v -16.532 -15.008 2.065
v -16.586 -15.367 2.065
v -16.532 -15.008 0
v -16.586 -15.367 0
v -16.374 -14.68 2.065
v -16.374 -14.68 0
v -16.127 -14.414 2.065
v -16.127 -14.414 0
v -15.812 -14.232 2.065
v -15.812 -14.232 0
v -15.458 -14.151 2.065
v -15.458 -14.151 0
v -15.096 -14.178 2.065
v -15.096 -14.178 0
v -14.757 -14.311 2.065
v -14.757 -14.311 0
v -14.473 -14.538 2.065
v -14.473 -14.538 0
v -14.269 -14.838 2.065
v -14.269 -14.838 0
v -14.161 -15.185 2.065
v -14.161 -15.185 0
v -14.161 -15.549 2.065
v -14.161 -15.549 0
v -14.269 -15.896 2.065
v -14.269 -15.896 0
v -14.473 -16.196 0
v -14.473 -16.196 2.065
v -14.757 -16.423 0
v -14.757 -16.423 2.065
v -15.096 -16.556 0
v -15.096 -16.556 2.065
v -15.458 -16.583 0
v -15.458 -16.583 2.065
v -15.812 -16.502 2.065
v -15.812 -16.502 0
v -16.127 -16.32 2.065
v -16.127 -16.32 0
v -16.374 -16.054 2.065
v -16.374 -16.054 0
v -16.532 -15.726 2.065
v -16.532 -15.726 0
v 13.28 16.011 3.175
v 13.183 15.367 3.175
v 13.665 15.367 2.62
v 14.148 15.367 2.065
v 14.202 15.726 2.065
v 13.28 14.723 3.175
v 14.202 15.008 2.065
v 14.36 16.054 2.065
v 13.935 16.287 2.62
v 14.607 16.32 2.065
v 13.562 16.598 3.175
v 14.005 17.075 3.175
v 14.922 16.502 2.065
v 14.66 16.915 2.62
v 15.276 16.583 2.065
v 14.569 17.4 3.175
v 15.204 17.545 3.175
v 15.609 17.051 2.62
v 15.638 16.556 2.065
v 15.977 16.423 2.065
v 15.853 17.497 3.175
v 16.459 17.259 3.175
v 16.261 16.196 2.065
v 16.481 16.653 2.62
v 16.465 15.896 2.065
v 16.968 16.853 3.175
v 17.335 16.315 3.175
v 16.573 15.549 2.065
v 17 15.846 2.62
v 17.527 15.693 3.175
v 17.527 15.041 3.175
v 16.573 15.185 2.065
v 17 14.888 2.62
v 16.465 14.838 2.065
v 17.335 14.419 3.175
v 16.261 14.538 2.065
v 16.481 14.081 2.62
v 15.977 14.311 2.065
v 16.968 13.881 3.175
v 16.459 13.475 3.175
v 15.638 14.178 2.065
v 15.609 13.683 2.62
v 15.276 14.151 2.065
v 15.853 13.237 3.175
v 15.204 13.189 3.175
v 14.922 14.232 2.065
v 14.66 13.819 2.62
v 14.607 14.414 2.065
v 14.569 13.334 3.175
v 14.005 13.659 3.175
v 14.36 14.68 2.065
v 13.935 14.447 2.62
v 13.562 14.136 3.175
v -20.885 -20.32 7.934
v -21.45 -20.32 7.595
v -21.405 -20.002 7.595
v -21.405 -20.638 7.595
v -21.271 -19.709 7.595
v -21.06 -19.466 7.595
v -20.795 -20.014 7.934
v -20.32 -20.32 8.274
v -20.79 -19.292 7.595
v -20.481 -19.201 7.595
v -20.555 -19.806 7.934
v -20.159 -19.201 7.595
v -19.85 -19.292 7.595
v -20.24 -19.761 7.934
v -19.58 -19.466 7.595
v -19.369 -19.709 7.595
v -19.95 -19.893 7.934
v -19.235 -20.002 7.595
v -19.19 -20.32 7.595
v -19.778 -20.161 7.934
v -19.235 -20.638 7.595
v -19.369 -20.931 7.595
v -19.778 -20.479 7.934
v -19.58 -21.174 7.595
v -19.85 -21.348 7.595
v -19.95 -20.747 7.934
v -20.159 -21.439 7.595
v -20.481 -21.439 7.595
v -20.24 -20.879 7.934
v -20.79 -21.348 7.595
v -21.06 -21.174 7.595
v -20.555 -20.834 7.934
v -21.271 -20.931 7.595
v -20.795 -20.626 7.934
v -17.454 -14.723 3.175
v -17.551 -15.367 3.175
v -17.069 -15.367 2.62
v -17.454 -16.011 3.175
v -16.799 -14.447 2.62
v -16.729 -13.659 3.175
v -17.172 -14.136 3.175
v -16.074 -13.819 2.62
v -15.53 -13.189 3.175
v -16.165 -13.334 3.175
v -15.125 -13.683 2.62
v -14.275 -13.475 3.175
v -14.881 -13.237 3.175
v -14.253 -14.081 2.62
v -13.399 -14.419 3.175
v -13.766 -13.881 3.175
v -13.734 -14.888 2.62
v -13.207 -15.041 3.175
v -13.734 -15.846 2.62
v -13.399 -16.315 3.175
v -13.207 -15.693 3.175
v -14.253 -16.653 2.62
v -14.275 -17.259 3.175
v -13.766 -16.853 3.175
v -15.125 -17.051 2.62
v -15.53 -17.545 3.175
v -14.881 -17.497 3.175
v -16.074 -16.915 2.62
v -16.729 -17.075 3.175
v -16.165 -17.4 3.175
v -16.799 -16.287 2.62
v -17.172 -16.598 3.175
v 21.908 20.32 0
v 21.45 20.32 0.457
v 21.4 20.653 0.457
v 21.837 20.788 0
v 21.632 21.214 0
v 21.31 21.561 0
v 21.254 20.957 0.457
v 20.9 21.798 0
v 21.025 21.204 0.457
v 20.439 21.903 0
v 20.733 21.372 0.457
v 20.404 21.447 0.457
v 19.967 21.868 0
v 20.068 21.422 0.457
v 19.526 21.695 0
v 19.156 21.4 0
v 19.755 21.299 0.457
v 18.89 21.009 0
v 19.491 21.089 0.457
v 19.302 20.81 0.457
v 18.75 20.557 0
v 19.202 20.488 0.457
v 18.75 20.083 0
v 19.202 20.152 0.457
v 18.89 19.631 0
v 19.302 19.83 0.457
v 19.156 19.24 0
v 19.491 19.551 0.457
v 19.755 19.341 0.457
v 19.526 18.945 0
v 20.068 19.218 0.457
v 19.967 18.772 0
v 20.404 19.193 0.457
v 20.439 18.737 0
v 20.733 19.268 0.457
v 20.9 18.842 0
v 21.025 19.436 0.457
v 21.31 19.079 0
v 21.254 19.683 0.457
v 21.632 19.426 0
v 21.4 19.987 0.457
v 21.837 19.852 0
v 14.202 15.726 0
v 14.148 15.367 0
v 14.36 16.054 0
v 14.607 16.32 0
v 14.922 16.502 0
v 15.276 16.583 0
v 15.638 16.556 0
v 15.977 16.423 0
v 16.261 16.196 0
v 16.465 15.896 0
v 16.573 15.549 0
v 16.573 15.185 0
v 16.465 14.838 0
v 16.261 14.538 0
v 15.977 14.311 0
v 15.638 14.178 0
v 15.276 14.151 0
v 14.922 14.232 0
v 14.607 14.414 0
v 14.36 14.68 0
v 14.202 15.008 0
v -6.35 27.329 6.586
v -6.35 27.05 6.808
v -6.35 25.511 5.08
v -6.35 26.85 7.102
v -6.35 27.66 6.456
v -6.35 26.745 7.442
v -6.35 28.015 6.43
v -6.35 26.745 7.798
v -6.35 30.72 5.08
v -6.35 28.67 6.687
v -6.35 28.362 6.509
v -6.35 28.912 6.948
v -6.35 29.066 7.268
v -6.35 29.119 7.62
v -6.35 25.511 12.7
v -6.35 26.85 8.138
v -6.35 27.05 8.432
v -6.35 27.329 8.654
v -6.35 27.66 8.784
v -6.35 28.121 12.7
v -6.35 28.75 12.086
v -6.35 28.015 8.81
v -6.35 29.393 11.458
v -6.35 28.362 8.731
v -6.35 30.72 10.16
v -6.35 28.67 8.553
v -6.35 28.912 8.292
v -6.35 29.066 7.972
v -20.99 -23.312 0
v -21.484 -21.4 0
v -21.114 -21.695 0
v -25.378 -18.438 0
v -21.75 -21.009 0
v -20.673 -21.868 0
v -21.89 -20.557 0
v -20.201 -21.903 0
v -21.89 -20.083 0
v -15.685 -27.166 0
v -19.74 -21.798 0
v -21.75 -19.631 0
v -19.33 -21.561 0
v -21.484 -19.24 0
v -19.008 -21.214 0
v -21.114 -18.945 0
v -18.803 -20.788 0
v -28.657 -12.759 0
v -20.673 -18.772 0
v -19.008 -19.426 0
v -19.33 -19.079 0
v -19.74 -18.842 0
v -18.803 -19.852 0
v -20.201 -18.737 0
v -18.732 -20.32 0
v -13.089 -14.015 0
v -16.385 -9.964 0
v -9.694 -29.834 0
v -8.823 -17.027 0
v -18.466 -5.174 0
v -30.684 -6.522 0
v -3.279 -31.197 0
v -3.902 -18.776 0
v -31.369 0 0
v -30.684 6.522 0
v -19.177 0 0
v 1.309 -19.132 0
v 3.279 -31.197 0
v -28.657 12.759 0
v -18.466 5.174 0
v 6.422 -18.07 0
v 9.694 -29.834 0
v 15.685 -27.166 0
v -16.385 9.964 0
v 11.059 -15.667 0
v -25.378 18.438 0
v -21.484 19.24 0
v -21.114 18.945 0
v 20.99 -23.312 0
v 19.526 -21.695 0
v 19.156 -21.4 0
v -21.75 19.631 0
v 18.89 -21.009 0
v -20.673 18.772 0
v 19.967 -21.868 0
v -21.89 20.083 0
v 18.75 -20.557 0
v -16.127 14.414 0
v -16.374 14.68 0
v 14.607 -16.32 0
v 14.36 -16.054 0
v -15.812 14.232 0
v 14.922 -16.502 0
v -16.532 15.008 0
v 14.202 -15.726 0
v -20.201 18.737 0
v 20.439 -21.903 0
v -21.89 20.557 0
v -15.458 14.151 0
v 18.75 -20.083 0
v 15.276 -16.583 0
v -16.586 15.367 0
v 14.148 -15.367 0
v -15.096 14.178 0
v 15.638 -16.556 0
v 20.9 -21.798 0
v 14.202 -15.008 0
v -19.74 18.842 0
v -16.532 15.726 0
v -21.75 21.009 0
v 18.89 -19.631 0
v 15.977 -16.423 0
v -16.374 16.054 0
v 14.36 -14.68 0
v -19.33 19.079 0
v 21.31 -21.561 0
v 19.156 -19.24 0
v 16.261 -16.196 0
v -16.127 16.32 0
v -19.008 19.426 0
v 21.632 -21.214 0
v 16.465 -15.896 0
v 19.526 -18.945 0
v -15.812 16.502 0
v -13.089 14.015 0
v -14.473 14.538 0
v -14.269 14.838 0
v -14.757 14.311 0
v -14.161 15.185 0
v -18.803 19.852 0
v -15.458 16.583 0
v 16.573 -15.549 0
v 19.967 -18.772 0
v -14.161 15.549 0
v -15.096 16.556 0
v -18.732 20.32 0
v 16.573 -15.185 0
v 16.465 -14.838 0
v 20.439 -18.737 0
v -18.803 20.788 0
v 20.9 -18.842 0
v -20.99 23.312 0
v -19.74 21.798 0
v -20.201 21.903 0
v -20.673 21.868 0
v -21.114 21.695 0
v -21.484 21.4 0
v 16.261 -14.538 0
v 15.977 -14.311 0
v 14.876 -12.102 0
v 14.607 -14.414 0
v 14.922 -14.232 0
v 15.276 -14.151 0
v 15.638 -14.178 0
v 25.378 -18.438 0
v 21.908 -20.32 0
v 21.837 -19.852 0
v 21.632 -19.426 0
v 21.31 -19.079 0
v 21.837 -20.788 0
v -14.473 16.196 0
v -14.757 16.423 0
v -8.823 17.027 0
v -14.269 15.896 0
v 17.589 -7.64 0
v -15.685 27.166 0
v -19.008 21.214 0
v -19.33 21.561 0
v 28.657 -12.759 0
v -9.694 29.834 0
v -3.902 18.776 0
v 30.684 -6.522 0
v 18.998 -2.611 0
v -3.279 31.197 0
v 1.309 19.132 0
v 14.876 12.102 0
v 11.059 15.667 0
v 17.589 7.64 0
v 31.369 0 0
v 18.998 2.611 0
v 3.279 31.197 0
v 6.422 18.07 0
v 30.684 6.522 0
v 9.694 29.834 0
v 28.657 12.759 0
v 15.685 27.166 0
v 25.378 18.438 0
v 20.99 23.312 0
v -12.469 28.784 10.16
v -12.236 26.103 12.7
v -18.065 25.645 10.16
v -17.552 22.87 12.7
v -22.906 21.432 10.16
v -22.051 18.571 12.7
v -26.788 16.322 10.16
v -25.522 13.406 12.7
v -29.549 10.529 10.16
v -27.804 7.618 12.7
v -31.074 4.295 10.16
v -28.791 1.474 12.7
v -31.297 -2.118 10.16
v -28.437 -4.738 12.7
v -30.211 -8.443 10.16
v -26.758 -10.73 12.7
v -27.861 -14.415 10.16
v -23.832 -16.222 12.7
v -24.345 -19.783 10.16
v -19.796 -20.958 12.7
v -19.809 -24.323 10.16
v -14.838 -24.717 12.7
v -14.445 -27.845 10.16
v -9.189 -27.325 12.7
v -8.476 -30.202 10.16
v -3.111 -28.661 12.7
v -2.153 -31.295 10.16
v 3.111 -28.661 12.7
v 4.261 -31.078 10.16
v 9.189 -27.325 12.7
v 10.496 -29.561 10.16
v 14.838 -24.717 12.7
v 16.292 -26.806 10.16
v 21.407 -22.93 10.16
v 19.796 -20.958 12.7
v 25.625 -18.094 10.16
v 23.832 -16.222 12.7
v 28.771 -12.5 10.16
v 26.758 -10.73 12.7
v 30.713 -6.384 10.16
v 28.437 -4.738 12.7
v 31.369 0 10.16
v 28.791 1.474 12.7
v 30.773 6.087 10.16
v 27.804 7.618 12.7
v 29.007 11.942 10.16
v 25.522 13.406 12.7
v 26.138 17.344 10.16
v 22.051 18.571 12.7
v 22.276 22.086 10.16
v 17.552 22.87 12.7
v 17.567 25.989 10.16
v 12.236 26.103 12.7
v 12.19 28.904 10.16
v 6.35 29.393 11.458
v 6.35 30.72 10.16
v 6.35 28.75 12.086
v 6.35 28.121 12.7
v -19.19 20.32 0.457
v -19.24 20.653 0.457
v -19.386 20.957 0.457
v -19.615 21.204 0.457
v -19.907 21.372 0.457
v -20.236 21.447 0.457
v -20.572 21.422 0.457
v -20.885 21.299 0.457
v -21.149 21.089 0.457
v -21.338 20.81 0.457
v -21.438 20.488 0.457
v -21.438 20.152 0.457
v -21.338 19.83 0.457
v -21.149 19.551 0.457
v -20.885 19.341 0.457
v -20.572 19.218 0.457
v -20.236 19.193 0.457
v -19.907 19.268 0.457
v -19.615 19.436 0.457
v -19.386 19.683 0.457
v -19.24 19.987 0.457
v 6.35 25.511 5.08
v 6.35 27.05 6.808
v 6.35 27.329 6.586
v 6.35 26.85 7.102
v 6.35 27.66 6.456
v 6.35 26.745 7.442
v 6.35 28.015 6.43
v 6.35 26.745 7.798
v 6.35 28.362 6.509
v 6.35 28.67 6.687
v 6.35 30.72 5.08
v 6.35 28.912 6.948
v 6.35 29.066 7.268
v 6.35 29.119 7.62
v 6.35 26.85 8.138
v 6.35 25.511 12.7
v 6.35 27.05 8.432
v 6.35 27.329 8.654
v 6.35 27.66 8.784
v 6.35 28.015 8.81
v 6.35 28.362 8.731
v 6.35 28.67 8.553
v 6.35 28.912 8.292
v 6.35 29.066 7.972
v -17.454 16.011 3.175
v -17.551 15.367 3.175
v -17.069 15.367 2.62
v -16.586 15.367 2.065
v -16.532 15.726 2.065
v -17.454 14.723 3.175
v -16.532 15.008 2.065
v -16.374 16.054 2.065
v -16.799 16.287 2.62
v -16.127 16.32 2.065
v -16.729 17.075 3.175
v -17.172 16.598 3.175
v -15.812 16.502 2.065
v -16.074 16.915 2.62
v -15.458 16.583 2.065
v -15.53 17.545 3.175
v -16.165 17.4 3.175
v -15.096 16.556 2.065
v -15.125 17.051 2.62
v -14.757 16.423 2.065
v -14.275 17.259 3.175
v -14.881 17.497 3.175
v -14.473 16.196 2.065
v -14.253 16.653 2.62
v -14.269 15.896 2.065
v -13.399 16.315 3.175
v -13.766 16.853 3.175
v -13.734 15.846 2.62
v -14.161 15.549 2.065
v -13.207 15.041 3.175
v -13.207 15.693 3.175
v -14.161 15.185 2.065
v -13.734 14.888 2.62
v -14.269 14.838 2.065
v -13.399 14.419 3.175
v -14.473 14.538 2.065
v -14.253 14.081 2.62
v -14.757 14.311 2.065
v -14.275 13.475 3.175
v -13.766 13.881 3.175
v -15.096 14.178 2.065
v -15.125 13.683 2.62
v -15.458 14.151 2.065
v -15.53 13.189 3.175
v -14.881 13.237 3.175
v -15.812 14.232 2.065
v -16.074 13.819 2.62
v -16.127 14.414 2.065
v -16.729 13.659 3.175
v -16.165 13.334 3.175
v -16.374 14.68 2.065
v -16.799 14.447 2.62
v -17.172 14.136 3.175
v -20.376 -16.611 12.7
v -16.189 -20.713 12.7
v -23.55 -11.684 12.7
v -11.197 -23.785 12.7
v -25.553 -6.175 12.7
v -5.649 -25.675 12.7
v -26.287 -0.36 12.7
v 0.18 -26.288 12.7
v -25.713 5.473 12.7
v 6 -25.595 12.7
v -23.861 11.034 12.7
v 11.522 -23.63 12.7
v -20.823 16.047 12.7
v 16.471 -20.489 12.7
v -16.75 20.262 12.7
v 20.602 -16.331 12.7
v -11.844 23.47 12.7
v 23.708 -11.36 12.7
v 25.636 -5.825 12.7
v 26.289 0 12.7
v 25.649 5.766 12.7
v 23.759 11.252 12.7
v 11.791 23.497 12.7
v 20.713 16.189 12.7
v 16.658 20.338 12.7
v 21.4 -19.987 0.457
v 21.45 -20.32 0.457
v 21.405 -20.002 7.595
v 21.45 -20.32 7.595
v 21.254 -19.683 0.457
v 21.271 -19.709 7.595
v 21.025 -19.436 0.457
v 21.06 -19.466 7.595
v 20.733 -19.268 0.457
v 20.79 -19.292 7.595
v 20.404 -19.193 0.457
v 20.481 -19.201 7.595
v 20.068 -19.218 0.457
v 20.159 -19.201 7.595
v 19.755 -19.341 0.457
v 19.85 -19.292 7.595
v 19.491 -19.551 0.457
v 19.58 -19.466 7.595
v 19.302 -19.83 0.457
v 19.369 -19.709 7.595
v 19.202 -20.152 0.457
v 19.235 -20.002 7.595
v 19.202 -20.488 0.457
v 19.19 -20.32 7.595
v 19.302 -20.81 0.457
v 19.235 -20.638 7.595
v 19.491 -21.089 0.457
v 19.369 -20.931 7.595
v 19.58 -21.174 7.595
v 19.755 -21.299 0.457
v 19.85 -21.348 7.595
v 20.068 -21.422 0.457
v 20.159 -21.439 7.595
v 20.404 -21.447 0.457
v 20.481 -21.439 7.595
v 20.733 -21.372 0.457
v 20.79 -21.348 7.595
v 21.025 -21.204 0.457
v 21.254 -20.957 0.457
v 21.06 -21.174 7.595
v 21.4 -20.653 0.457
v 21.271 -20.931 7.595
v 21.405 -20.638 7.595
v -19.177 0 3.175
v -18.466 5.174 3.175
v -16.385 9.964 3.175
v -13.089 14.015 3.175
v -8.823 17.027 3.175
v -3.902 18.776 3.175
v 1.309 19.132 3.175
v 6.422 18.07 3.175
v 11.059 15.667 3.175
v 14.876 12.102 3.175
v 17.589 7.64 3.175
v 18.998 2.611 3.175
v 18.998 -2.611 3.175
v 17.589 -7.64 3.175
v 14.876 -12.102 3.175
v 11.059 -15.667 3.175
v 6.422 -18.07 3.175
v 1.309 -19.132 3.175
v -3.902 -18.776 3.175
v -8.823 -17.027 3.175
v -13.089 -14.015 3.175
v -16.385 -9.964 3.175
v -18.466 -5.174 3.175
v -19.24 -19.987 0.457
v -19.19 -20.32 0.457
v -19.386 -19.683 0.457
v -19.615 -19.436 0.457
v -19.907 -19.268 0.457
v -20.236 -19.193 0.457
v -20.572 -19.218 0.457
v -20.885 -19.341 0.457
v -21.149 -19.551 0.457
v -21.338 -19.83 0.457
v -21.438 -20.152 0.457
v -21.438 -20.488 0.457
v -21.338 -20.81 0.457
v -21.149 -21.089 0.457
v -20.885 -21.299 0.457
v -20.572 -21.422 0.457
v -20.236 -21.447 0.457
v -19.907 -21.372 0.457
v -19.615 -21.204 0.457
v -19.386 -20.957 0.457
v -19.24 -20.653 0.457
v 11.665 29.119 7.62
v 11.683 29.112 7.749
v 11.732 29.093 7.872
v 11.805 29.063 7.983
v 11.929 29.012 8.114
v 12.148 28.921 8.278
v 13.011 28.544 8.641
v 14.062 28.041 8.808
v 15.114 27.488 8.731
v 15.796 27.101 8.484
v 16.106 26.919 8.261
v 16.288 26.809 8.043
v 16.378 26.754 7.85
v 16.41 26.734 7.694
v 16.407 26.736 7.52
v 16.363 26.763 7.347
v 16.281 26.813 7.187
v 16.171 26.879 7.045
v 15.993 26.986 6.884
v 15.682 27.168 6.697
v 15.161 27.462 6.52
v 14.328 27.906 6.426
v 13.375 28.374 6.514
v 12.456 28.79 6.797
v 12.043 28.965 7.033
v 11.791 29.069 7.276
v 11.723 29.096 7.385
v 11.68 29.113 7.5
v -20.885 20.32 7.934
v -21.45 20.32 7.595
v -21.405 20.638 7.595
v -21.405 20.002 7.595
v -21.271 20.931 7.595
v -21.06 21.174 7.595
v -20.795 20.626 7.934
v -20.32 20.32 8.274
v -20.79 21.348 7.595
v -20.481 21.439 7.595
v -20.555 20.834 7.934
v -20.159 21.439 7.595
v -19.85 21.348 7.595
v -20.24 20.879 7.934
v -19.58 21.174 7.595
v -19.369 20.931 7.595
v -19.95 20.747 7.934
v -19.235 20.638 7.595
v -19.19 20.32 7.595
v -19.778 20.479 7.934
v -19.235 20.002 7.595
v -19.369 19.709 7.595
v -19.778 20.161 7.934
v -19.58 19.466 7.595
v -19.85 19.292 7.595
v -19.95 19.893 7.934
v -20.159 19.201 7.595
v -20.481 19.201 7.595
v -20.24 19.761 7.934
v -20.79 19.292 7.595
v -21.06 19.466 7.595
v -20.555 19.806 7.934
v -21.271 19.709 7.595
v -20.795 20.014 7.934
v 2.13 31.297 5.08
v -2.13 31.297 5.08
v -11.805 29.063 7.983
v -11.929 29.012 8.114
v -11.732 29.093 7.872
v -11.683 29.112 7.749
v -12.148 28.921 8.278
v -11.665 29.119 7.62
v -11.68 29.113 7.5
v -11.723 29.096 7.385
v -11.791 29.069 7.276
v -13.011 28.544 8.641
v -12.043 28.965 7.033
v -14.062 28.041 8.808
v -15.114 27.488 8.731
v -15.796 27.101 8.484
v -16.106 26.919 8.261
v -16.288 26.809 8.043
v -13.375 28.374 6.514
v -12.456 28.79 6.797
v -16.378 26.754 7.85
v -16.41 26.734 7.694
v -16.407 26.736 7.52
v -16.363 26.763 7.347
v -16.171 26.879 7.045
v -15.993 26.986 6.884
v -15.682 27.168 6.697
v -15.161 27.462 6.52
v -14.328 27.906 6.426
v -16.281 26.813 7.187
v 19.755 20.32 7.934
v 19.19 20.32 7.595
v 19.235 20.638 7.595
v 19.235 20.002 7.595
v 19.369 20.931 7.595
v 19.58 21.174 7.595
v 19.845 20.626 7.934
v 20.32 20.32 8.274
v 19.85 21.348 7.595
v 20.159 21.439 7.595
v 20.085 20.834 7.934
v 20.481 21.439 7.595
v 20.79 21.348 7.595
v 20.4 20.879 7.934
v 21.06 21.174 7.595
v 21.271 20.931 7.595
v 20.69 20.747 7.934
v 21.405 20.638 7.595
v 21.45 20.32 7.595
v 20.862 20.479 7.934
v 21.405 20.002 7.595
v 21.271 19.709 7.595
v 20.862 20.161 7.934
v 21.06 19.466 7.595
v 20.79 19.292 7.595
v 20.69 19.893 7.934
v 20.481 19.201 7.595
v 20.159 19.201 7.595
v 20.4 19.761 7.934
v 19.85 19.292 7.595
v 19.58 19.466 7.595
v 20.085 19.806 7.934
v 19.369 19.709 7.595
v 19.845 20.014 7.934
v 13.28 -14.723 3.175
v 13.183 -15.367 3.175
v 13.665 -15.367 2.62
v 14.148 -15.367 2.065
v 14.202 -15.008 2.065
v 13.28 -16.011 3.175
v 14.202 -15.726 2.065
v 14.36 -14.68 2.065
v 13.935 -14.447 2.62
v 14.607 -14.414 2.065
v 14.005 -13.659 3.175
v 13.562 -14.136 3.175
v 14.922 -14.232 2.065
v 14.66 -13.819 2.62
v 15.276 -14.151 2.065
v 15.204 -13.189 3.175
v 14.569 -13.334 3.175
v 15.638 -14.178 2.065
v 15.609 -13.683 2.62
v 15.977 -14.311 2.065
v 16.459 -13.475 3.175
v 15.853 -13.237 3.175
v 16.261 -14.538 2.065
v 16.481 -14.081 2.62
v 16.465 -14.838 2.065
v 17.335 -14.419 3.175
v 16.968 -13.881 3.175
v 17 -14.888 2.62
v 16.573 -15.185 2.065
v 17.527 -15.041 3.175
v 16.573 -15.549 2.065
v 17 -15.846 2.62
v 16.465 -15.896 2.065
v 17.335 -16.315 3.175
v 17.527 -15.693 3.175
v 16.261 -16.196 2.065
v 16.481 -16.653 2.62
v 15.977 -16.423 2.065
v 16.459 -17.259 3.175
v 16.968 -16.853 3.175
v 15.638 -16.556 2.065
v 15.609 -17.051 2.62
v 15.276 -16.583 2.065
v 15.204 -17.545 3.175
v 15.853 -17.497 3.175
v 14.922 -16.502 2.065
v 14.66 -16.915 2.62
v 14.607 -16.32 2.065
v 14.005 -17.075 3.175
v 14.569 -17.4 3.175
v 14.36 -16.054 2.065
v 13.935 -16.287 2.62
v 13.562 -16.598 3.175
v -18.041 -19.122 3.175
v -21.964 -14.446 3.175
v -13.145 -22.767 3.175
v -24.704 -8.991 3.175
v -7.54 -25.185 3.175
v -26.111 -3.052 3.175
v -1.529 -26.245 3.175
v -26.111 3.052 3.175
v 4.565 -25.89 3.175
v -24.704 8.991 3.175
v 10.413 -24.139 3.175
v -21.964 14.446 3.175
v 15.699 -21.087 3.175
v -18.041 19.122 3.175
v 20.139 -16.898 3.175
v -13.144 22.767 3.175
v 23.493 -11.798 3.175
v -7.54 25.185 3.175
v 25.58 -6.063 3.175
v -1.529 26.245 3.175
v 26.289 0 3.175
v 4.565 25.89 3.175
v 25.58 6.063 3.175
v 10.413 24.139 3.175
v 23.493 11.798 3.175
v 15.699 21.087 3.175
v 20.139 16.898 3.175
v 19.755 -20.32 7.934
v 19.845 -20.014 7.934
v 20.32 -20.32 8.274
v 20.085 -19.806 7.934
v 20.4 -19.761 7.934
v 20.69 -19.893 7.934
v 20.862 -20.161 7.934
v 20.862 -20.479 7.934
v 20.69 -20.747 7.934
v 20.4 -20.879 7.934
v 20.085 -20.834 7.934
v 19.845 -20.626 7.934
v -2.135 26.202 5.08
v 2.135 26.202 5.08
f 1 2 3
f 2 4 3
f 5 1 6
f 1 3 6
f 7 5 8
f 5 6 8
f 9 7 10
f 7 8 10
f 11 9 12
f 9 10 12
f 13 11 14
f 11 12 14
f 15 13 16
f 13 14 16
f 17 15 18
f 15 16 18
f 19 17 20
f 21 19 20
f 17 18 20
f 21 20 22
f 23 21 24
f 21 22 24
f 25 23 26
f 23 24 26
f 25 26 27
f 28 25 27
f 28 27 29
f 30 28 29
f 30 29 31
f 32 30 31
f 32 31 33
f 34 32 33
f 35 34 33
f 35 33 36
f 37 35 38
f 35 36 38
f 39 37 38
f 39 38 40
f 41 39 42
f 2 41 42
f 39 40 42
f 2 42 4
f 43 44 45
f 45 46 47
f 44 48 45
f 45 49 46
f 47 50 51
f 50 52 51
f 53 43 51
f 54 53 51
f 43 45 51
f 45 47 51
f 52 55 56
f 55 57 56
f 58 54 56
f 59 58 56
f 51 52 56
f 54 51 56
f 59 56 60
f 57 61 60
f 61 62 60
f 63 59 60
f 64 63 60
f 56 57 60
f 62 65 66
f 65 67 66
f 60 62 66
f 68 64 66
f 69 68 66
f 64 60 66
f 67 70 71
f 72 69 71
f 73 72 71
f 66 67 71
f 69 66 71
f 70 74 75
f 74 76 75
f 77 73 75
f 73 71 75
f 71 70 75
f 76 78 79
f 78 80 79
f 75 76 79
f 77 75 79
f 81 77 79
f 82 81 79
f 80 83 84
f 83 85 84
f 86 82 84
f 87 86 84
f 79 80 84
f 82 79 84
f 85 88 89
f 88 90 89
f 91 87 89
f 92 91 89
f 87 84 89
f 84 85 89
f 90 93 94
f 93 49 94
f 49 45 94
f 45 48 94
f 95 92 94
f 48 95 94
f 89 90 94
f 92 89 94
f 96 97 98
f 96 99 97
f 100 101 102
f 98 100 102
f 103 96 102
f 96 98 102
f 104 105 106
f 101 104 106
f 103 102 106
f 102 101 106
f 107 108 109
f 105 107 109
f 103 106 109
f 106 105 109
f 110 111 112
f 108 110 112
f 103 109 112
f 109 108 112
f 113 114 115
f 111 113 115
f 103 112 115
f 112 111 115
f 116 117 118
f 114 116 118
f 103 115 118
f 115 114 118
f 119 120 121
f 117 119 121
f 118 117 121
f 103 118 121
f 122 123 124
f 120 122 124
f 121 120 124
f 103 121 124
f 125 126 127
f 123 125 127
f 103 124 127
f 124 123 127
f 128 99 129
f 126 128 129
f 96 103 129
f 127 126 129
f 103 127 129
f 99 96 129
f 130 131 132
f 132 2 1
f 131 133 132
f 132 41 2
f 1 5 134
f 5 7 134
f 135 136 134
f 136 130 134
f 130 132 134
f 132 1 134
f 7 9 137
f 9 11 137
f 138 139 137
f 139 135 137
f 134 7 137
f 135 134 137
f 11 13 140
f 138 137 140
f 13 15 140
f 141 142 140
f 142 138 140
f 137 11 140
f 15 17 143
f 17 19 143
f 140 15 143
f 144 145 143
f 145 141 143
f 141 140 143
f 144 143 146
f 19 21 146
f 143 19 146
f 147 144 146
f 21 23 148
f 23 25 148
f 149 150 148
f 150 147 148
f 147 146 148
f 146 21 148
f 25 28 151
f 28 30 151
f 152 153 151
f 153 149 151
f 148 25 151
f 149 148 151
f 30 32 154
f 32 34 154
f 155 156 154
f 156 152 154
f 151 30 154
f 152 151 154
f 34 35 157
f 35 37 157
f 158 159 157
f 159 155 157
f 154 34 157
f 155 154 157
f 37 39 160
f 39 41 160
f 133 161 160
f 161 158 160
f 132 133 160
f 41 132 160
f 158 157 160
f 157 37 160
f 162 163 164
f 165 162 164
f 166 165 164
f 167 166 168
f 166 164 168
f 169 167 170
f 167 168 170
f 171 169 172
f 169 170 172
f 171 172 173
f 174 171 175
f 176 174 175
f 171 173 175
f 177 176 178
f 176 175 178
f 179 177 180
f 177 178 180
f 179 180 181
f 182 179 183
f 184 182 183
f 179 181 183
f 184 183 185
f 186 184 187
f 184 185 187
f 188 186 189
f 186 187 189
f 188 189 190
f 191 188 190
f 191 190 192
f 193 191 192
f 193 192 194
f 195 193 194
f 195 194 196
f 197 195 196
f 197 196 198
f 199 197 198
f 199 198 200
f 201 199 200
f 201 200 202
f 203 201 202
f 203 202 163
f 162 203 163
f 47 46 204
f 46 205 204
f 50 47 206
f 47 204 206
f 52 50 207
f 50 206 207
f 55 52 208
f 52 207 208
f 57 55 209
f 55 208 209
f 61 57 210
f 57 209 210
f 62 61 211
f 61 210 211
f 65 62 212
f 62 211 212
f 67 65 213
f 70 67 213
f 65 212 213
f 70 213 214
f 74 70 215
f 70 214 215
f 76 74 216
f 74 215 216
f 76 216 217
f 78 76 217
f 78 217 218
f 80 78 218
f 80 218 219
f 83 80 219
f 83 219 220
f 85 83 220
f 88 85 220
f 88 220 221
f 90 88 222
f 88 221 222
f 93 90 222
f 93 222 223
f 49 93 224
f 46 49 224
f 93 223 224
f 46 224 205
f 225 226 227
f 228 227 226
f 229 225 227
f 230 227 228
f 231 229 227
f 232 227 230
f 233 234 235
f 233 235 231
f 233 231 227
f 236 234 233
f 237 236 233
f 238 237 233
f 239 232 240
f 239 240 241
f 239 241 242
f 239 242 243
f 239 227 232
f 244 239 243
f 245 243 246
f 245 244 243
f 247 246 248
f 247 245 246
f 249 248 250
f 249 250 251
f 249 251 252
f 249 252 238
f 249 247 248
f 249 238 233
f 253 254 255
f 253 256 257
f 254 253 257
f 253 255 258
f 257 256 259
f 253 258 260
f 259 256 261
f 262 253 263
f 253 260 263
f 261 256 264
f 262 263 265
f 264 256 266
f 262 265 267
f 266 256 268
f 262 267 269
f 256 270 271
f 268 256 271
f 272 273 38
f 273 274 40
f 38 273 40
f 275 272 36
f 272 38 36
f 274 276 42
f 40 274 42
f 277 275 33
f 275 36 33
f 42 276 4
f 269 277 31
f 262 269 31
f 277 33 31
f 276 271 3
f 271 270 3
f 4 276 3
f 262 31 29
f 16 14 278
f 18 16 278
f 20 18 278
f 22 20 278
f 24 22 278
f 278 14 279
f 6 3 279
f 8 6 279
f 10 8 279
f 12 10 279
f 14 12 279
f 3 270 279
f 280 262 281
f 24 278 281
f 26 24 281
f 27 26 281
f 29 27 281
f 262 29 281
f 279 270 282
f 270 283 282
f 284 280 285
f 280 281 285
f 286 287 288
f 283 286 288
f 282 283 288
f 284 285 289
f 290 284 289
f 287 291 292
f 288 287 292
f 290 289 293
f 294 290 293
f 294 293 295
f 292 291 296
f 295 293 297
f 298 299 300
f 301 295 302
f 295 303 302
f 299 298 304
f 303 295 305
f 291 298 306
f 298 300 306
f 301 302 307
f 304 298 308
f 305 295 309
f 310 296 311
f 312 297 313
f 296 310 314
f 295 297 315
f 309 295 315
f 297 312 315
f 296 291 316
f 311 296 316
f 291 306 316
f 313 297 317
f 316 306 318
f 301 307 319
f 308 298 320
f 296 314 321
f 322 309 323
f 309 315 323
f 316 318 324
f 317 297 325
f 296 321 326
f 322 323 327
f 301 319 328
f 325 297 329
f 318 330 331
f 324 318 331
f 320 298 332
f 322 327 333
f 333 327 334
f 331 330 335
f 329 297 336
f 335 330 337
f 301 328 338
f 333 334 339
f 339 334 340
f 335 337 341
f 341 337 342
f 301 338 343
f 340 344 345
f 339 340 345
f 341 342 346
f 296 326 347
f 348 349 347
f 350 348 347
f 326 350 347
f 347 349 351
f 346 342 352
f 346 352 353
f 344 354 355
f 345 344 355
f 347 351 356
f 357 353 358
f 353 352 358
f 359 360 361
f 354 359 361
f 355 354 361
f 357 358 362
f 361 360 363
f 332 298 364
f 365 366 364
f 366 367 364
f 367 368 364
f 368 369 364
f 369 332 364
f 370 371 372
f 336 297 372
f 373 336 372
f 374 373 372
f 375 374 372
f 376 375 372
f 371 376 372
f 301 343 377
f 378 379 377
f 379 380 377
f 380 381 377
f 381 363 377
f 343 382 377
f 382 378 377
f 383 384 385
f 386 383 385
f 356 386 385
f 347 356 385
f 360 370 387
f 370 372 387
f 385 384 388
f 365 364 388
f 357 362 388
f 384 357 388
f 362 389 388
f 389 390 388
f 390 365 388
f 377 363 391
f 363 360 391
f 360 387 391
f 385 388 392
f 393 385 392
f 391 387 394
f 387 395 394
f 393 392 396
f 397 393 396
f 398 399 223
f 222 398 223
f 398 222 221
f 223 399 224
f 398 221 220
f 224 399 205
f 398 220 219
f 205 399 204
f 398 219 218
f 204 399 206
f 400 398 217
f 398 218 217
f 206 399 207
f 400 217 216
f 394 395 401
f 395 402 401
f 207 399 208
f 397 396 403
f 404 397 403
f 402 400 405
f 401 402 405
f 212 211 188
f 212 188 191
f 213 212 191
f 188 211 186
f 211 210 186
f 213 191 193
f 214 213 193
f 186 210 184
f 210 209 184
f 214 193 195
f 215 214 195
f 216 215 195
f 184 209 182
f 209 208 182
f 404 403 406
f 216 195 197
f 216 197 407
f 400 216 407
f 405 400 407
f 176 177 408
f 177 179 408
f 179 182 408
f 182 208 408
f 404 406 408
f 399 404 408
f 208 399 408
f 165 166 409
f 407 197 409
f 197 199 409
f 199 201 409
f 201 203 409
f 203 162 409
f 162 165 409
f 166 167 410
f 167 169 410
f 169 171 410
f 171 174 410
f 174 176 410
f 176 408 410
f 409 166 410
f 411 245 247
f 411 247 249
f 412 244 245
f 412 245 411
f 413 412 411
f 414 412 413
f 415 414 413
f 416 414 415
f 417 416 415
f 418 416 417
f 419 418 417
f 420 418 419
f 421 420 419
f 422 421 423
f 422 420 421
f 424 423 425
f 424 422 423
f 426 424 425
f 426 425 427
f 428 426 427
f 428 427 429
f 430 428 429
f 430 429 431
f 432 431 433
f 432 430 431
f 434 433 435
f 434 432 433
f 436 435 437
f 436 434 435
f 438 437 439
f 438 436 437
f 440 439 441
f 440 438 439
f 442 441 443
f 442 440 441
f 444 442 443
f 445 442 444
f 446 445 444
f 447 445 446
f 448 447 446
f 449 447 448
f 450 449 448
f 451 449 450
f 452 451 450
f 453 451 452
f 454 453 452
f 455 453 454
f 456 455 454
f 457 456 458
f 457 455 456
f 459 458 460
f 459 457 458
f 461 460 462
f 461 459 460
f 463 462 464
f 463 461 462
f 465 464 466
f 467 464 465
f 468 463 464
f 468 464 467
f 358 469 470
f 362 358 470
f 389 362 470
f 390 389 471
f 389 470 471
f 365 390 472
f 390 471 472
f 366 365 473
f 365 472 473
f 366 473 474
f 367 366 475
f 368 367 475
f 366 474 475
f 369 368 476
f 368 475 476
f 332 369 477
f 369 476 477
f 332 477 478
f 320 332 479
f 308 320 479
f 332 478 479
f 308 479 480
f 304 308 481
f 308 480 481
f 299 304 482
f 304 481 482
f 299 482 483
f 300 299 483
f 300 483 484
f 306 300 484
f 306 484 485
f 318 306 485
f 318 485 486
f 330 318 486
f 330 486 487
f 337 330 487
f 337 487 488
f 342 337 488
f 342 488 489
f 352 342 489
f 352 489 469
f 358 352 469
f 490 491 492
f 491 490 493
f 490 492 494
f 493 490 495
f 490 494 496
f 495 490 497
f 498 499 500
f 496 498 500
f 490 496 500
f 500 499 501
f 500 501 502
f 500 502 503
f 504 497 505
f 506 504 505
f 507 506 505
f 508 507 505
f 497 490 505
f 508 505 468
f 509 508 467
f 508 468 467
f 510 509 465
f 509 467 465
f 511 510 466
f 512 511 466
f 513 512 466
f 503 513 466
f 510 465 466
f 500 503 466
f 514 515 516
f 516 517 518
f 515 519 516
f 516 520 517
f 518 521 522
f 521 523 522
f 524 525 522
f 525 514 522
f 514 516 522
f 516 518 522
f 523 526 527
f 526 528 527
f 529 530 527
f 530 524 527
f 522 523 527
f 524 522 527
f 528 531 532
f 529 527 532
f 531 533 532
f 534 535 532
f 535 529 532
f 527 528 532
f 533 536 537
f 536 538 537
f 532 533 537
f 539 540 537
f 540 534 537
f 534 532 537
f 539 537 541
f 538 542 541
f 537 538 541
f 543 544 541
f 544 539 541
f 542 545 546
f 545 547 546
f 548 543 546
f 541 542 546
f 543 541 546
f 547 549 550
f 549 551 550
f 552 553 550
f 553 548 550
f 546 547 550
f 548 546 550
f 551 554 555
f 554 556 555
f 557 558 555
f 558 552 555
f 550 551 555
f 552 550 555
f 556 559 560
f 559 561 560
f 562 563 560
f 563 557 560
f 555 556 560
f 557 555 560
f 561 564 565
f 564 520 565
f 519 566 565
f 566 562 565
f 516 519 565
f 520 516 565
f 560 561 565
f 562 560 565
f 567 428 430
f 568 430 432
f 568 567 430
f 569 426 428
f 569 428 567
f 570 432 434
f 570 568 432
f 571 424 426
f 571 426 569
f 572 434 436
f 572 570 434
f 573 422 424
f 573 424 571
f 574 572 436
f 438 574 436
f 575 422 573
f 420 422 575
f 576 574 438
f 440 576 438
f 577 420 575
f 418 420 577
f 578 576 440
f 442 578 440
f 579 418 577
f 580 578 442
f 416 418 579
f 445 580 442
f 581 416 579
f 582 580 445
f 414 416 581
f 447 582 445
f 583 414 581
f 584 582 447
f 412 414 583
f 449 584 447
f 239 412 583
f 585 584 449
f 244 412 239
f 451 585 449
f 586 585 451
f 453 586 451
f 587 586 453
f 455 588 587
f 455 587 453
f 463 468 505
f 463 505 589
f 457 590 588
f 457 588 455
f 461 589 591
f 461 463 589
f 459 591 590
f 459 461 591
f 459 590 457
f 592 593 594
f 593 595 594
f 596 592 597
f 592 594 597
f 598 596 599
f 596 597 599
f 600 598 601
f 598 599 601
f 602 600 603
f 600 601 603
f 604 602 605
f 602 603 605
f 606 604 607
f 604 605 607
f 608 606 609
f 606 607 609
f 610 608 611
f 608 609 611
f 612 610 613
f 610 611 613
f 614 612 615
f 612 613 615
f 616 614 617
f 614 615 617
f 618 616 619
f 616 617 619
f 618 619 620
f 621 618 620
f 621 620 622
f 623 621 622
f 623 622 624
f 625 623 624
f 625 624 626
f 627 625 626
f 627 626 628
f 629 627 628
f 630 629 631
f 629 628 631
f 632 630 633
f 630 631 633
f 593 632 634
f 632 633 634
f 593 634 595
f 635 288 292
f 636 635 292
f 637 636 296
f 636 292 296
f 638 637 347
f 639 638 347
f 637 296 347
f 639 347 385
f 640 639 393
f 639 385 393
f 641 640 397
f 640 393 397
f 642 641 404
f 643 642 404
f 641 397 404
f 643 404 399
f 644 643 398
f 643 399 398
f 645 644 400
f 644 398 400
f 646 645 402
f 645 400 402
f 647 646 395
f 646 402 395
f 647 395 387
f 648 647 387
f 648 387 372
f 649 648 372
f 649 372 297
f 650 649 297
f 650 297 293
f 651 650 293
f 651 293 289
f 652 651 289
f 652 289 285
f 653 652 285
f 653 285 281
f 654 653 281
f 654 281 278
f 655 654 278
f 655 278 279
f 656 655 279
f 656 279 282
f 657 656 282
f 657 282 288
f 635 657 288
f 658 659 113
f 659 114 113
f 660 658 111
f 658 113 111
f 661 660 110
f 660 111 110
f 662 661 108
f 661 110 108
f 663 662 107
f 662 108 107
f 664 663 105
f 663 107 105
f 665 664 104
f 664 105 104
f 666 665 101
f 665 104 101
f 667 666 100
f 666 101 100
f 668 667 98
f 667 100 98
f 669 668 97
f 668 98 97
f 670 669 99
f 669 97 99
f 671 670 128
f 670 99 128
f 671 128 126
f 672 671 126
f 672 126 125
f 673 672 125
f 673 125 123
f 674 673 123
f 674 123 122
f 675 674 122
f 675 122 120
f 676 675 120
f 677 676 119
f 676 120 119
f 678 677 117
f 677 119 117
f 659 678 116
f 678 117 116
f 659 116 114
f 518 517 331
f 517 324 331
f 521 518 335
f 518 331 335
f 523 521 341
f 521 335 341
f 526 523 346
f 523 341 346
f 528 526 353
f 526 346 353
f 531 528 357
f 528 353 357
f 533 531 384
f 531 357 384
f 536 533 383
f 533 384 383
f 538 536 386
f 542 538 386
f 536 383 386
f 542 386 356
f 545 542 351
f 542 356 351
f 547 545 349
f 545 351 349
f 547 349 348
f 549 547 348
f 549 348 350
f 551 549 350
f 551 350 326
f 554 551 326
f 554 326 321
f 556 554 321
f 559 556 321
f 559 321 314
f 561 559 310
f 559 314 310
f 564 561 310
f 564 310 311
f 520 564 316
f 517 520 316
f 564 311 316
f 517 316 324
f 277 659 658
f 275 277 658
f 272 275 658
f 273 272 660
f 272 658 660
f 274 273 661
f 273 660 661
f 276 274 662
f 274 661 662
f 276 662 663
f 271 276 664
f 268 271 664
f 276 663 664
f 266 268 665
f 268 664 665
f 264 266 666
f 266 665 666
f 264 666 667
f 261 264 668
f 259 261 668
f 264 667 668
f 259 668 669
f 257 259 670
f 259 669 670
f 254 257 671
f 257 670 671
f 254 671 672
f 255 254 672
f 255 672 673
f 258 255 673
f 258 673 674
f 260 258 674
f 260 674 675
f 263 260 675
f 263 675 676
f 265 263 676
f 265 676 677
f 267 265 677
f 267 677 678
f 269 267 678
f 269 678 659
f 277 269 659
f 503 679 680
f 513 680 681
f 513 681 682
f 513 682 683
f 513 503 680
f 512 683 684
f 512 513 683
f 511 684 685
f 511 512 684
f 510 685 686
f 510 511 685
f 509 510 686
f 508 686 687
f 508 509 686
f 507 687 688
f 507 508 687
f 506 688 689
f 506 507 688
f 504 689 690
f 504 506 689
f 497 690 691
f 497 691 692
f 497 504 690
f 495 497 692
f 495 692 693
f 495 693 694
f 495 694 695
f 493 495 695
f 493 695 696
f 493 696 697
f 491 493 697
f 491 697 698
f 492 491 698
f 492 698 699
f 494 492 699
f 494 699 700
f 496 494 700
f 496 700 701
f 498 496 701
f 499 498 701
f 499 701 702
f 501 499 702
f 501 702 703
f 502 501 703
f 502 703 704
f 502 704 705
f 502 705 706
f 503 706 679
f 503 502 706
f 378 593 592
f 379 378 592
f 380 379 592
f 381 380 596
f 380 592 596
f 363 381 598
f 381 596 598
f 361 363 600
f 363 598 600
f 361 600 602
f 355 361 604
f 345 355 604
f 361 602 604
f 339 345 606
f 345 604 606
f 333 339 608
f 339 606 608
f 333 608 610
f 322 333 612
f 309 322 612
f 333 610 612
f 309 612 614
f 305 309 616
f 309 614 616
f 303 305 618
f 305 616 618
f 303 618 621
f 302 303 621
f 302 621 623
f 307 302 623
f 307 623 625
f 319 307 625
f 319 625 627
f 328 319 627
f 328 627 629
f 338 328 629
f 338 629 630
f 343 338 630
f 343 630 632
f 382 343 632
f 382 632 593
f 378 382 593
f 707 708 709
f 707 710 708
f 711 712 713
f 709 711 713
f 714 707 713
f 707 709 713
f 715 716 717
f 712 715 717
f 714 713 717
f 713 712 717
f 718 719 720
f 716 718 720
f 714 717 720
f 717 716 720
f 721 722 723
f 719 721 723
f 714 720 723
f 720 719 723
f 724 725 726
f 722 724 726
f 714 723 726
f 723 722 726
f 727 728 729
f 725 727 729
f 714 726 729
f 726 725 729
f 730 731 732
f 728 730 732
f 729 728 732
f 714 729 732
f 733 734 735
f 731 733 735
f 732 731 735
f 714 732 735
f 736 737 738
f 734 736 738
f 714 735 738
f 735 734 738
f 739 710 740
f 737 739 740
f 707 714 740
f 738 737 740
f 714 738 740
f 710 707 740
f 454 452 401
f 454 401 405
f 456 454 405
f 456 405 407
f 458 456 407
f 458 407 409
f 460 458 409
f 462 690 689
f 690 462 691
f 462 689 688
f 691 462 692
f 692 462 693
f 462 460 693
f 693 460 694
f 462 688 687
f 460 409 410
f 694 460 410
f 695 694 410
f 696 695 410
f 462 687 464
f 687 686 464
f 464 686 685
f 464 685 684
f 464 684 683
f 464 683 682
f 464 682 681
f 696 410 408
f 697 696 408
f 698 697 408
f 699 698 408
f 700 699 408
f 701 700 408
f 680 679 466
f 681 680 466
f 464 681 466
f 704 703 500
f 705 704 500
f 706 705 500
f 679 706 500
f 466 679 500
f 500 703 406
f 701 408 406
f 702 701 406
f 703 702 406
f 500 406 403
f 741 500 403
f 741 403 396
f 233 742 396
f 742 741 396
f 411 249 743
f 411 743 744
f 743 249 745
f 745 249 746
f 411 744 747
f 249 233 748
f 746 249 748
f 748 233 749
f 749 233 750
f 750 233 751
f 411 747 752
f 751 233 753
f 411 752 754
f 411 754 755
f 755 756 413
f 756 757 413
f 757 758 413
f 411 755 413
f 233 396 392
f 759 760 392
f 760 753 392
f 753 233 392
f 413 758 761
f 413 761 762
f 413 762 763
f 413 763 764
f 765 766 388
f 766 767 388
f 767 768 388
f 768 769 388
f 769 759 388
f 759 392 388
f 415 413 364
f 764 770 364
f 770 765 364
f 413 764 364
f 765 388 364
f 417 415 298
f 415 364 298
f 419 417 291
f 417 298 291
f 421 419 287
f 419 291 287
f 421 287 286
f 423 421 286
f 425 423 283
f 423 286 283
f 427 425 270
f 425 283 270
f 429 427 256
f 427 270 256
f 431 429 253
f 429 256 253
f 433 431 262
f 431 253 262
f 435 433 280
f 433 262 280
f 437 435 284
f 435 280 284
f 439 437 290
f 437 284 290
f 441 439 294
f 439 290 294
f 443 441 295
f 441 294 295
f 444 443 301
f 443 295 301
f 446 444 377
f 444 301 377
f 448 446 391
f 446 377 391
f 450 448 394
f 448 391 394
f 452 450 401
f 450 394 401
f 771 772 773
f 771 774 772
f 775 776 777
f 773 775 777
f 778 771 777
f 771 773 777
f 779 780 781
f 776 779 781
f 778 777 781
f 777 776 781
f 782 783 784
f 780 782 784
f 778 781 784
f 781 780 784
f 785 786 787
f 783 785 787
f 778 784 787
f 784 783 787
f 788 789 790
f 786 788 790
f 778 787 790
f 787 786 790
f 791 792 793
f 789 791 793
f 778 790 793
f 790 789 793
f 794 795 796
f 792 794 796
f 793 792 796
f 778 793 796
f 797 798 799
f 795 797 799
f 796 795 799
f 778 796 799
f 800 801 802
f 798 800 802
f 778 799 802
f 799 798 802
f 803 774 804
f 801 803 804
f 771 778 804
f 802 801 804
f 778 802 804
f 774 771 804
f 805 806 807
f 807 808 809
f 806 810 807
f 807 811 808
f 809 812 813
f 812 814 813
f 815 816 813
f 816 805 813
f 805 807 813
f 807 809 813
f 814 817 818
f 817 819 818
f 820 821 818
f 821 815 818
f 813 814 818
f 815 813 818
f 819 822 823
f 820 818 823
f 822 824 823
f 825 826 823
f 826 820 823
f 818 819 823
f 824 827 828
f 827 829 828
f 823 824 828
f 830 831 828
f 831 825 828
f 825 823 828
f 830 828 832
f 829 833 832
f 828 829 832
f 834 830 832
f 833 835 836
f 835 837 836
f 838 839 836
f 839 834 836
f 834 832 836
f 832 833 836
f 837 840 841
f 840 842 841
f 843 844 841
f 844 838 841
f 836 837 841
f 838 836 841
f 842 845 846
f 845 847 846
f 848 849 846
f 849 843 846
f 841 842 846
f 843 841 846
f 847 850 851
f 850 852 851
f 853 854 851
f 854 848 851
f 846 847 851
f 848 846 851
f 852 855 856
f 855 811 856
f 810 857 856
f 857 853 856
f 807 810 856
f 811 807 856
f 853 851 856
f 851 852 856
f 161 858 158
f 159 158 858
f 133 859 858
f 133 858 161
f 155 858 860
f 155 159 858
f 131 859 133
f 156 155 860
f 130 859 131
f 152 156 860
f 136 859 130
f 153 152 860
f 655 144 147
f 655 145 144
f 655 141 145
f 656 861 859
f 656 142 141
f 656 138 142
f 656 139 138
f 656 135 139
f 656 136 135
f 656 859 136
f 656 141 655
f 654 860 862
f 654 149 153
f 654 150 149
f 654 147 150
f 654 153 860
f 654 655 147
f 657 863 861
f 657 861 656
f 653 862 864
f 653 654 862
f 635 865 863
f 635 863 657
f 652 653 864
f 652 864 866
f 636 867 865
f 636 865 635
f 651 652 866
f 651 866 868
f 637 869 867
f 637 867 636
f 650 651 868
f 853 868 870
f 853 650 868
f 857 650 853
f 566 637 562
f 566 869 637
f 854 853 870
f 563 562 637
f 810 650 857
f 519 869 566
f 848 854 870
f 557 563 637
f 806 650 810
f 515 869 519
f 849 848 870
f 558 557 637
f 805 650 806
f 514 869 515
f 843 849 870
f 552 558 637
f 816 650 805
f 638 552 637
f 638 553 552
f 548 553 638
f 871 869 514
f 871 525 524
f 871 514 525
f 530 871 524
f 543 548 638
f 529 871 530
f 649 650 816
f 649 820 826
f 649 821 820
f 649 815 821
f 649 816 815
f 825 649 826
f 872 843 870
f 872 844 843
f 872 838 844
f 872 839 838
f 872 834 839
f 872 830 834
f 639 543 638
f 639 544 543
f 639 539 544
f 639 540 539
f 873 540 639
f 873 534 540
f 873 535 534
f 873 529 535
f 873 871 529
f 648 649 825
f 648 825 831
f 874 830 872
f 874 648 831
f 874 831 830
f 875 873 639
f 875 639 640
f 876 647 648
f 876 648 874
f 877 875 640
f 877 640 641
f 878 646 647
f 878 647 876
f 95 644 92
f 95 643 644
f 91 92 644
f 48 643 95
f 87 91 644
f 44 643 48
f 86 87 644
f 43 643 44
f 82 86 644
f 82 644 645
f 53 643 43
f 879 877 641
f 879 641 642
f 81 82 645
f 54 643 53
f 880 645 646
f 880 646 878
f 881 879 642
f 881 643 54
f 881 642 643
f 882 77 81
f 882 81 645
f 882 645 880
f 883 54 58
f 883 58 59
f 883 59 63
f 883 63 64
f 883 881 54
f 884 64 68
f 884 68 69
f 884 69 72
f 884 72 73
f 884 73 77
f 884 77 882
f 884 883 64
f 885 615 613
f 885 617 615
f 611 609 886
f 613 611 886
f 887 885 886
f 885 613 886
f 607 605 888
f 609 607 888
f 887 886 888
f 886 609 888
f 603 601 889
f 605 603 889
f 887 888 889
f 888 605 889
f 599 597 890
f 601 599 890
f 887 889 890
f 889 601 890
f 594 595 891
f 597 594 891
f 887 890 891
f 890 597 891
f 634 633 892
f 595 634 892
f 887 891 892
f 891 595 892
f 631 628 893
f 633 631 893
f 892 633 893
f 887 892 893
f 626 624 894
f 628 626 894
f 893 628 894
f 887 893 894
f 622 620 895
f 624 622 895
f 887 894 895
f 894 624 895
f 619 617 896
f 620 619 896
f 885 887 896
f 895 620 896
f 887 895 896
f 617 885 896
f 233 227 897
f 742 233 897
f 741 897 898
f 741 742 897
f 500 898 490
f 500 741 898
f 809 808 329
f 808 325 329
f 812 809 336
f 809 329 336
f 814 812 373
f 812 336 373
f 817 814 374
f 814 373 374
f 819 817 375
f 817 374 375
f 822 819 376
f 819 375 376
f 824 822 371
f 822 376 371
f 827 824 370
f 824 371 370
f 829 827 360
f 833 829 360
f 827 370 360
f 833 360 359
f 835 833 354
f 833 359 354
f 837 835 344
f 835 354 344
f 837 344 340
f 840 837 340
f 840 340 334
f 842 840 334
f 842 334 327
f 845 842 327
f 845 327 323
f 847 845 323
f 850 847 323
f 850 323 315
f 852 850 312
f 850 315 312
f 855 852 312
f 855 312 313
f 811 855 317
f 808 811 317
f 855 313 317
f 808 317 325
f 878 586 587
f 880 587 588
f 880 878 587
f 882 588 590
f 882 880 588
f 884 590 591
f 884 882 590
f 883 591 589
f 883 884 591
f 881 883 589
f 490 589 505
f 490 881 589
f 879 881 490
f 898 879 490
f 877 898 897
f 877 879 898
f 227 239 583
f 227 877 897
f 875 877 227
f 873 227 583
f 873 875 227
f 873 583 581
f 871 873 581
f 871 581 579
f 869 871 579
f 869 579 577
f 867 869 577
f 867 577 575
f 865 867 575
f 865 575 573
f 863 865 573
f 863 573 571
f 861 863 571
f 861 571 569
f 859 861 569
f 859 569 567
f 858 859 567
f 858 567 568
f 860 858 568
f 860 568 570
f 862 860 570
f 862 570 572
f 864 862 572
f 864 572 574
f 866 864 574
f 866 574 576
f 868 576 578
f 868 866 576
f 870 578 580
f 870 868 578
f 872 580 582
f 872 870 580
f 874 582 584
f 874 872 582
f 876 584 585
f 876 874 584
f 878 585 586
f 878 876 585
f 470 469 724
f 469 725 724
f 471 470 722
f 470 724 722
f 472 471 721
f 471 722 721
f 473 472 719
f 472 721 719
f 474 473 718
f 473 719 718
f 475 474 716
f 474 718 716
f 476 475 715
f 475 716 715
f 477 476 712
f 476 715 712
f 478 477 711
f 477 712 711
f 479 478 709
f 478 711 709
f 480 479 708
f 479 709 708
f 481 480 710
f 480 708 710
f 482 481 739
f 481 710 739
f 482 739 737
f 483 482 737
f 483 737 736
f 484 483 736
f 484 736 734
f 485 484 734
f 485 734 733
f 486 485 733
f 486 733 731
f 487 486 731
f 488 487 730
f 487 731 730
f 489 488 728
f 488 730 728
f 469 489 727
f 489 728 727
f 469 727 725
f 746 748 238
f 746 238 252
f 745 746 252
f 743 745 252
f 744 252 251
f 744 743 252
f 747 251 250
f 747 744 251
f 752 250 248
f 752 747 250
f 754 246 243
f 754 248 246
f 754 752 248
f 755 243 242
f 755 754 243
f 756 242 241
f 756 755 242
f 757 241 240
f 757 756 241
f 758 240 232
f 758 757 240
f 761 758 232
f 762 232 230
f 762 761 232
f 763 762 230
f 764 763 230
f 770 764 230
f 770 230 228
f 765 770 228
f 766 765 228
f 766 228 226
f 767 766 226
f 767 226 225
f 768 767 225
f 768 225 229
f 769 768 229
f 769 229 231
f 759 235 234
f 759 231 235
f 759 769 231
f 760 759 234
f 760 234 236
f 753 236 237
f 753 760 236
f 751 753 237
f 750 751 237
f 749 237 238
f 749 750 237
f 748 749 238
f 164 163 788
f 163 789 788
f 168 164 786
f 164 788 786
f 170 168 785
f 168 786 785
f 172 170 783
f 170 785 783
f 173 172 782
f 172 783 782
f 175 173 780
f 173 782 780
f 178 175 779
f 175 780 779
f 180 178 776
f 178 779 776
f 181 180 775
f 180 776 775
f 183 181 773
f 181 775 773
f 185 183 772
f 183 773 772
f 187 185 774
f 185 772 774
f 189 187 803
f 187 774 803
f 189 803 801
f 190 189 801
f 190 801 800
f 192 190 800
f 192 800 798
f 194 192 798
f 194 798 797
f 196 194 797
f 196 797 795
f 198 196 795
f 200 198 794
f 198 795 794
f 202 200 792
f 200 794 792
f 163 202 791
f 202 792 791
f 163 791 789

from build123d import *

# Parameters (mm, degrees)
SKETCH1_R                                         = 31.369
BOSS_EXTRUDE1_DEPTH                               = 12.7
SKETCH2_R                                         = 19.177
CUT_EXTRUDE1_DEPTH                                = 47.144537293
CUT_EXTRUDE2_START                                = -9.525
SKETCH3_R                                         = 26.289
CUT_EXTRUDE2_DEPTH                                = 9.525
CHAMFER1_SIZE                                     = 2.54
CSK_FOR_2_FLAT_HEAD_MACHINE_SCREW_100_D           = 2.4384
CSK_FOR_2_FLAT_HEAD_MACHINE_SCREW_100_CSINK_D     = 4.3688
CSK_FOR_2_FLAT_HEAD_MACHINE_SCREW_100_CSINK_ANGLE = 82
F_4_40_TAPPED_HOLE1_D                             = 2.2606
F_4_40_TAPPED_HOLE1_DEPTH                         = 7.5946
F_4_40_TAPPED_HOLE1_CSINK_D                       = 3.175
F_4_40_TAPPED_HOLE1_CSINK_ANGLE                   = 90
F_4_40_TAPPED_HOLE1_TIP                           = 0.679152758
SKETCH12_W                                        = 12.7
SKETCH12_H                                        = 8.945423361
CUT_EXTRUDE3_DEPTH                                = 7.62
CUT_EXTRUDE4_DEPTH                                = 51.675705442
CUT_EXTRUDE4_DEPTH_BACK                           = 51.675705442
SKETCH13_R                                        = 1.1938


with BuildPart() as part:
    # Sketch1 → Boss-Extrude1 (new body)
    with BuildSketch(Plane.XY):
        Circle(SKETCH1_R)
    extrude(amount=BOSS_EXTRUDE1_DEPTH)

    # Sketch2 → Cut-Extrude1 (cut, through all)
    with BuildSketch(Plane(origin=(0, 0, 0), x_dir=(-1, 0, 0), z_dir=(0, 0, -1))):
        Circle(SKETCH2_R)
    extrude(amount=-CUT_EXTRUDE1_DEPTH, mode=Mode.SUBTRACT)

    # Sketch3 → Cut-Extrude2 (cut)
    with BuildSketch(Plane.XY.offset(12.7).offset(CUT_EXTRUDE2_START)):
        Circle(SKETCH3_R)
    extrude(amount=CUT_EXTRUDE2_DEPTH, mode=Mode.SUBTRACT)

    # Chamfer1
    chamfer1_edges = [part.edges().sort_by_distance(p)[0] for p in [
        (-31.369, 0, 12.7),
    ]]
    chamfer(chamfer1_edges, length=CHAMFER1_SIZE)

    # CSK for #2 Flat Head Machine Screw (100)1 (through all)
    with Locations(Plane.XY.offset(3.175)):
        with Locations((-15.367, -15.367), (-15.367, 15.367), (15.367, 15.367), (15.367, -15.367)):
            CounterSinkHole(CSK_FOR_2_FLAT_HEAD_MACHINE_SCREW_100_D / 2, CSK_FOR_2_FLAT_HEAD_MACHINE_SCREW_100_CSINK_D / 2, counter_sink_angle=CSK_FOR_2_FLAT_HEAD_MACHINE_SCREW_100_CSINK_ANGLE)

    # #4-40 Tapped Hole1
    with Locations(Plane(origin=(0, 0, 0), x_dir=(-1, 0, 0), z_dir=(0, 0, -1))):
        with Locations((-20.32, 20.32), (20.32, 20.32), (20.32, -20.32), (-20.32, -20.32)):
            CounterSinkHole(F_4_40_TAPPED_HOLE1_D / 2, F_4_40_TAPPED_HOLE1_CSINK_D / 2, depth=F_4_40_TAPPED_HOLE1_DEPTH, counter_sink_angle=F_4_40_TAPPED_HOLE1_CSINK_ANGLE)
            with Locations((0, 0, -(F_4_40_TAPPED_HOLE1_DEPTH + F_4_40_TAPPED_HOLE1_TIP / 2))):  # 118° drill point
                Cone(0, F_4_40_TAPPED_HOLE1_D / 2, F_4_40_TAPPED_HOLE1_TIP, mode=Mode.SUBTRACT)

    # Sketch12 → Cut-Extrude3 (cut)
    with BuildSketch(Plane.XY.offset(12.7)):
        with Locations((0, 26.89628832)):
            Rectangle(SKETCH12_W, SKETCH12_H)
    extrude(amount=-CUT_EXTRUDE3_DEPTH, mode=Mode.SUBTRACT)

    # Sketch13 → Cut-Extrude4 (cut, two sides: drawn at the far end of the back side and taken through both)
    with BuildSketch(Plane(origin=(-6.35, 0, 0), x_dir=(0, 0, -1), z_dir=(1, 0, 0)).offset(-CUT_EXTRUDE4_DEPTH_BACK)):
        with Locations(Location((-7.62, 27.925564792, 0), (0, 0, 90))):
            Circle(SKETCH13_R)
    extrude(amount=CUT_EXTRUDE4_DEPTH + CUT_EXTRUDE4_DEPTH_BACK, mode=Mode.SUBTRACT)


solid = part.part
